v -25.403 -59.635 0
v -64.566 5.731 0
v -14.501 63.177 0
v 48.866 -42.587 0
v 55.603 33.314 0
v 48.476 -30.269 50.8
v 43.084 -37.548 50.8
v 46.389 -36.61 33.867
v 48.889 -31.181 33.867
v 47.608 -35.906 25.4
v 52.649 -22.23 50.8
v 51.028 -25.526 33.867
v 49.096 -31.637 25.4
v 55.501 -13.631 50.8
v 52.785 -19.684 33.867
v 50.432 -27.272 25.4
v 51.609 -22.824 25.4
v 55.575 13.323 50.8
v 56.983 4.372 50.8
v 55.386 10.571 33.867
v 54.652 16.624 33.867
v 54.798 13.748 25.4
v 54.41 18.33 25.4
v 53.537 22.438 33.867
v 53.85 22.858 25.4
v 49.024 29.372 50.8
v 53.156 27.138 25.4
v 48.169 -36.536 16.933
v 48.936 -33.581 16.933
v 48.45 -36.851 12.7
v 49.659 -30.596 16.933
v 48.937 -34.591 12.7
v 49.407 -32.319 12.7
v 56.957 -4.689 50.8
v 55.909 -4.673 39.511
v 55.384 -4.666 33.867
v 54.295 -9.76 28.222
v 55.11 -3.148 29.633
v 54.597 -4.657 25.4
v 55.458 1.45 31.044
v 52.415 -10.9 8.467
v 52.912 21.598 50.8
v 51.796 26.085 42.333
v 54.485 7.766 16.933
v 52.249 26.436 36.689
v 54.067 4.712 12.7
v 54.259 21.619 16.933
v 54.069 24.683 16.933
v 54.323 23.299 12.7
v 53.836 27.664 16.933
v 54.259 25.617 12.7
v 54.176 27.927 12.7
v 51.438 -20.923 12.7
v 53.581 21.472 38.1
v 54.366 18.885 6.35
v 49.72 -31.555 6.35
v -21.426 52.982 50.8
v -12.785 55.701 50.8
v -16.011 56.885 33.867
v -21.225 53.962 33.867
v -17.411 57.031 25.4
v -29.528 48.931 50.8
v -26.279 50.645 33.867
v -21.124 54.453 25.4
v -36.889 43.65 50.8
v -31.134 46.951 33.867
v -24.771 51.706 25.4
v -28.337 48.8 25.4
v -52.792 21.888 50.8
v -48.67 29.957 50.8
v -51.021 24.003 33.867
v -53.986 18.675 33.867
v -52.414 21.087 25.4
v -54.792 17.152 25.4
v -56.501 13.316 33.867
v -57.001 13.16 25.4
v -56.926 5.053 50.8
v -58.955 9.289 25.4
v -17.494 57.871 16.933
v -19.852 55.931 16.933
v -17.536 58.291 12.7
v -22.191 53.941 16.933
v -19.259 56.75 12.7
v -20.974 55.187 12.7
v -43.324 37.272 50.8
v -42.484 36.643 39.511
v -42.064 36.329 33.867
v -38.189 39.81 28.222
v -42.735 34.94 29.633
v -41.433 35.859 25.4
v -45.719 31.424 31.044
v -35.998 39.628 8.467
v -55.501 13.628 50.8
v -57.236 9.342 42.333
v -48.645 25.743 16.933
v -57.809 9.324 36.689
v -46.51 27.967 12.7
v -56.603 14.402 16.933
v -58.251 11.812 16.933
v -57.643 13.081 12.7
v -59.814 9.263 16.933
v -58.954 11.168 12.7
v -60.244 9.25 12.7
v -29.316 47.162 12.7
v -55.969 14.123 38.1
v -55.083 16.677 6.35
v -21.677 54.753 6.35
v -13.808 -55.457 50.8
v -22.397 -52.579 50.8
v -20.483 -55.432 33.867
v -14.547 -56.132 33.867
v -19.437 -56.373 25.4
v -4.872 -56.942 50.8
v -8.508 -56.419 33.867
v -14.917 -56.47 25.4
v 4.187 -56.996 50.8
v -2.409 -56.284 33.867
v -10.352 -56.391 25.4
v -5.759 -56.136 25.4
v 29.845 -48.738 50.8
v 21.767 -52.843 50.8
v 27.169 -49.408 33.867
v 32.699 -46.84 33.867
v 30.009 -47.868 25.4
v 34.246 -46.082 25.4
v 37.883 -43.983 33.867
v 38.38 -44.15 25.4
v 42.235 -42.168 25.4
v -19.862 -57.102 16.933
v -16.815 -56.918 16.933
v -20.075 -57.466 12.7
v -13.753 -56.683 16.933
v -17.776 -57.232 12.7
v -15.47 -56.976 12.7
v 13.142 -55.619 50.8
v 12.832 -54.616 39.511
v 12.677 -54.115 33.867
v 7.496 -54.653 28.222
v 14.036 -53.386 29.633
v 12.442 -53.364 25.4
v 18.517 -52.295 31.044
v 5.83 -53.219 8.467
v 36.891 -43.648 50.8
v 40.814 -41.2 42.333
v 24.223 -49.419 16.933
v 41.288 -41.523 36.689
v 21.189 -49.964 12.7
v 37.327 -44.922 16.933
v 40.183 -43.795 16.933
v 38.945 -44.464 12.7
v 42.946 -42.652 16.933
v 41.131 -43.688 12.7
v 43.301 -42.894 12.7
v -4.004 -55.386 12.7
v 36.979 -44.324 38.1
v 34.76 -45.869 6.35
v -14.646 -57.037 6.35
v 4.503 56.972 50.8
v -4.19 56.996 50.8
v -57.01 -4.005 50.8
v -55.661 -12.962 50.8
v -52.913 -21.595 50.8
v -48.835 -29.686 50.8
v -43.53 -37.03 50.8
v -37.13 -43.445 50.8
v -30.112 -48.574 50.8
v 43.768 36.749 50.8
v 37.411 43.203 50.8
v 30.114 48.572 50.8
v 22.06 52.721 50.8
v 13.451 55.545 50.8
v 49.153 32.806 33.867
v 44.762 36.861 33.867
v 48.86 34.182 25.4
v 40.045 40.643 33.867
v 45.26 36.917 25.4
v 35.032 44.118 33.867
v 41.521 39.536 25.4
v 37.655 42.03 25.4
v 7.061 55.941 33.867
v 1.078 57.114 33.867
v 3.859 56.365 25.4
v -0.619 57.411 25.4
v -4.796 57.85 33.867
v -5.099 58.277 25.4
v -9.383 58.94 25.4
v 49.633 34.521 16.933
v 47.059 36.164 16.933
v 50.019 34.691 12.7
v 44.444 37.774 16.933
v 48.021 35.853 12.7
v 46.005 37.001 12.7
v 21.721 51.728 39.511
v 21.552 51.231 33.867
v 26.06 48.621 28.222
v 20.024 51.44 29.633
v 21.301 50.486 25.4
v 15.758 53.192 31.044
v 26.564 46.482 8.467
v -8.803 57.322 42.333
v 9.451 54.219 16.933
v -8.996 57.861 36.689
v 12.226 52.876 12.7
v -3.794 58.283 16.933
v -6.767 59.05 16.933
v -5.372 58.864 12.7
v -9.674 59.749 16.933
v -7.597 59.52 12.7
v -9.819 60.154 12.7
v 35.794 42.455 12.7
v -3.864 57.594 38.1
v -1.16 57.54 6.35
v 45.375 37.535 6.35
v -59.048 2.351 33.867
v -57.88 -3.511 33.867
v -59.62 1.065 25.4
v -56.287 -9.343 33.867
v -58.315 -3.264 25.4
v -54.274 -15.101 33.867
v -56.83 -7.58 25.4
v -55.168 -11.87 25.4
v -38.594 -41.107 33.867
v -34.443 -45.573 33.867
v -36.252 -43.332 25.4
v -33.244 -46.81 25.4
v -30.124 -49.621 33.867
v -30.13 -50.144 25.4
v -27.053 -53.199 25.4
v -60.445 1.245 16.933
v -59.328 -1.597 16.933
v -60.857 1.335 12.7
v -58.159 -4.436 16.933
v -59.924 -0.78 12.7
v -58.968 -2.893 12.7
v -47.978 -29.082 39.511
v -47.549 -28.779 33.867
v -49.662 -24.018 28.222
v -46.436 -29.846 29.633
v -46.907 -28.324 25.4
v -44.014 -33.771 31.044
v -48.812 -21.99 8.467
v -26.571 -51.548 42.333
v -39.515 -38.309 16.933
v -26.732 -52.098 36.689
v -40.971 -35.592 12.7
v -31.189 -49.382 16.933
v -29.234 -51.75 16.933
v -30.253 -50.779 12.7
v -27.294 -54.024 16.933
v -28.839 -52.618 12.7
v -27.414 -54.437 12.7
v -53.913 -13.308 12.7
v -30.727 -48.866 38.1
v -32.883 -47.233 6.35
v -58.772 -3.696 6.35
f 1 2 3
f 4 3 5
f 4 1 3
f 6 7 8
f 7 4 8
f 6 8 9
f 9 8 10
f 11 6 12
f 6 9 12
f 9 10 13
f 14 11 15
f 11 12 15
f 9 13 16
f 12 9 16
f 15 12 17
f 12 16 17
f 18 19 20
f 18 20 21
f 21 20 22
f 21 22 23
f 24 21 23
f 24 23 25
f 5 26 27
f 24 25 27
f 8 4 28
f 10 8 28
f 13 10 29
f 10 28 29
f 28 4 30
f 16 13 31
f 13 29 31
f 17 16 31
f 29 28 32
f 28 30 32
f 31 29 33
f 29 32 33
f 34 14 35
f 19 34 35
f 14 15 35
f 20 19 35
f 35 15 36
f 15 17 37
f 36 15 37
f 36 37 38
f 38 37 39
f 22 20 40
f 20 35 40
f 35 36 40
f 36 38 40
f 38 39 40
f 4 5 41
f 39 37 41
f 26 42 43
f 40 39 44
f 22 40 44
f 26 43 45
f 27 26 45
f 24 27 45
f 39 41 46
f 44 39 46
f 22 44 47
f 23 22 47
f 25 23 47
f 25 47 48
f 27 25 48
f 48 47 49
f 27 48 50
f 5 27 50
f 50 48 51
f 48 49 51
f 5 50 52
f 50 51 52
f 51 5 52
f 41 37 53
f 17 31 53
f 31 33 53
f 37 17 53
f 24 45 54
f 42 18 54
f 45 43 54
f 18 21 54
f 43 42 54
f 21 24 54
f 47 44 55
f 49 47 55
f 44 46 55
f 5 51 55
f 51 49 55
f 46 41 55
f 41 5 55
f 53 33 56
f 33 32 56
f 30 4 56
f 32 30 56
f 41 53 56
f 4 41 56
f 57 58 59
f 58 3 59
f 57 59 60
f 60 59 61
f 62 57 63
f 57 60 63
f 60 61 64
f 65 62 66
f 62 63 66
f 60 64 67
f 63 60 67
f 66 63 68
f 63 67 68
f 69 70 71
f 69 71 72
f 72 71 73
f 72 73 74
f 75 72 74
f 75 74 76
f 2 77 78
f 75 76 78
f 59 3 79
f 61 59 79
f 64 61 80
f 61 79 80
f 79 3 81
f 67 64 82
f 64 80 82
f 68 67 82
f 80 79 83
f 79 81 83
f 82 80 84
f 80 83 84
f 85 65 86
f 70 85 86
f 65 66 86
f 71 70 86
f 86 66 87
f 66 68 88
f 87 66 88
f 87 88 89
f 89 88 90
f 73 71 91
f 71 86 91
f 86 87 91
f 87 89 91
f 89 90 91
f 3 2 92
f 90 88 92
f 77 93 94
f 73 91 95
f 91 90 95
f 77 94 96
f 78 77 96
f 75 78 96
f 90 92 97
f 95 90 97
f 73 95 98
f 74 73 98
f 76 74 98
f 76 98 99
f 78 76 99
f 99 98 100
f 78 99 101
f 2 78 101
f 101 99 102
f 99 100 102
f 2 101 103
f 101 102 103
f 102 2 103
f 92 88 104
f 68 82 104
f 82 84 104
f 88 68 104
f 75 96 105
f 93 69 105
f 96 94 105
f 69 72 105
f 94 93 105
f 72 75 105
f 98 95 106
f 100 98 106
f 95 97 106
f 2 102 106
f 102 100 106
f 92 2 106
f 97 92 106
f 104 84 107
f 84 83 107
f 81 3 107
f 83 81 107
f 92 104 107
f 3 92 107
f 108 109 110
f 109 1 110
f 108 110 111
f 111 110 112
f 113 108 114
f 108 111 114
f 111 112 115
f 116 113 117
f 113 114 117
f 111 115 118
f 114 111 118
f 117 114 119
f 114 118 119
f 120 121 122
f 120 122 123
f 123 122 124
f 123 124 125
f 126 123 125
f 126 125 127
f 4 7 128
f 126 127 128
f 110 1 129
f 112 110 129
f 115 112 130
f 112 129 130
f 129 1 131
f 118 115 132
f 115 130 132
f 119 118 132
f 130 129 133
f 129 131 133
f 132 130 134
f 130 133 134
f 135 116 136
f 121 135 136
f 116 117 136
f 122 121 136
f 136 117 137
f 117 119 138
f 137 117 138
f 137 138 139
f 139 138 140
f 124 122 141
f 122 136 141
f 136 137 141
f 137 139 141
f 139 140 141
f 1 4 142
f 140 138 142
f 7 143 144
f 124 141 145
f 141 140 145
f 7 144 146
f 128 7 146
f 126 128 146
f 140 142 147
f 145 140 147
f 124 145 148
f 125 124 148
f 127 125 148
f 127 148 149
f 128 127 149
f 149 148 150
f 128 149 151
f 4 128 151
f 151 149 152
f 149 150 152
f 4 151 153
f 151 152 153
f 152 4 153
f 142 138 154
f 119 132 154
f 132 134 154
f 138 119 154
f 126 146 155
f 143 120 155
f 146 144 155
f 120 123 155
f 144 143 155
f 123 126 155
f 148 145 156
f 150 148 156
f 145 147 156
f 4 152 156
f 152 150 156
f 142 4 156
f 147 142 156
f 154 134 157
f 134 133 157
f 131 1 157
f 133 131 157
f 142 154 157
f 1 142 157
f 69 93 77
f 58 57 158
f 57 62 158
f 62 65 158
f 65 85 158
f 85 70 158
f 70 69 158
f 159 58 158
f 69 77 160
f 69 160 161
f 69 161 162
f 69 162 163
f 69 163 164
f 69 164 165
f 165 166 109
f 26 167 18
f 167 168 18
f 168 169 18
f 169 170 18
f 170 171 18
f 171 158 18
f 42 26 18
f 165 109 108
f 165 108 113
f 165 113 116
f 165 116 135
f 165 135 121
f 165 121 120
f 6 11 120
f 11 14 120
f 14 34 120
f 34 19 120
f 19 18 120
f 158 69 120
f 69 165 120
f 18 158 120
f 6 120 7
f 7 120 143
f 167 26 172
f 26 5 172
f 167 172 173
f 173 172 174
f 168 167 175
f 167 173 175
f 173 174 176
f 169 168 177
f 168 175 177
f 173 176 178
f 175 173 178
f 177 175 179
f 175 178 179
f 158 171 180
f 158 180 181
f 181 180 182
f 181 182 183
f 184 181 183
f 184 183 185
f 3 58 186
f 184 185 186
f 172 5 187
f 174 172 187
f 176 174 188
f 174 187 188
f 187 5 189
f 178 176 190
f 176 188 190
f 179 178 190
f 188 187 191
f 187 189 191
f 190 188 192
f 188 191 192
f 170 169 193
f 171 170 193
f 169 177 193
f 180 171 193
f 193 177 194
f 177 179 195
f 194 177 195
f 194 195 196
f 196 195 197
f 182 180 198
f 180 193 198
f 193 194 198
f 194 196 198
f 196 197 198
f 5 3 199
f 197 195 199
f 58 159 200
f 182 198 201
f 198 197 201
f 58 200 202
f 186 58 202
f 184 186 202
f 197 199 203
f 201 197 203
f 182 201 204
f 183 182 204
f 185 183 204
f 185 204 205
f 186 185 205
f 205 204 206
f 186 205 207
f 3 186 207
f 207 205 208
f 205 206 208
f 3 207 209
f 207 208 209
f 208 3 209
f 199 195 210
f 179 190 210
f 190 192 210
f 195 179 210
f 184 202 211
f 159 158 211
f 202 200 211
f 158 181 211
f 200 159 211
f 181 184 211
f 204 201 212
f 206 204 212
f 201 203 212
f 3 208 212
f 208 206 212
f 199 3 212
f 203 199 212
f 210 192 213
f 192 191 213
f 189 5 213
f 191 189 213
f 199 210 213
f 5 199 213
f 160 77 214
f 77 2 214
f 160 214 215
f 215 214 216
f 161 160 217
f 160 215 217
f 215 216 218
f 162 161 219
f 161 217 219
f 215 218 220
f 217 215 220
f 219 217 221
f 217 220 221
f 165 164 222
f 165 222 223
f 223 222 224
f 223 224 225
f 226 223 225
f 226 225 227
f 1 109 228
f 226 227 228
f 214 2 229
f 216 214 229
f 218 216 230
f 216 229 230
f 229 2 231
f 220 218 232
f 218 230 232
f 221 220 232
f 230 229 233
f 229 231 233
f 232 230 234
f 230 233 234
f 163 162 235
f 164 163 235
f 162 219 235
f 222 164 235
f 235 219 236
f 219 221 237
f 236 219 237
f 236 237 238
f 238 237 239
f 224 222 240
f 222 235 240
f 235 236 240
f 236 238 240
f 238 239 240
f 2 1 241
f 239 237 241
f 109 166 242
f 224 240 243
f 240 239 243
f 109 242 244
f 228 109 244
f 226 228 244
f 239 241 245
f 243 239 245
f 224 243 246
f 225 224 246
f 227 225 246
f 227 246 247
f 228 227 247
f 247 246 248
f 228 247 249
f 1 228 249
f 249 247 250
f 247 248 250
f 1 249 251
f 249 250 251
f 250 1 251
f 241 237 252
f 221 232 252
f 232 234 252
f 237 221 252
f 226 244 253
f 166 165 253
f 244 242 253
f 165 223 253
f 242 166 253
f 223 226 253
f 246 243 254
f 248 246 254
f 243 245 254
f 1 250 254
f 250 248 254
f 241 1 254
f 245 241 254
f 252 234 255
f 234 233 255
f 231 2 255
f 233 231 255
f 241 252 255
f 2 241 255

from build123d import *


# Not quite as in the source:
# - the arcs of a loft's sections are written as splines that run evenly, so that the points pair up as in the source's solid


with BuildPart() as f3:
    # F2 (on offset) → F3 section 0
    with BuildSketch(Plane.XY.offset(50.8)):
        with BuildLine():
            add(Edge.make_bspline(
                [(-56.9261720001, 5.0530625782), (-57.190749738, 2.0724151823), (-57.2207451344, -0.9290245136), (-56.8108338665, -6.8997040281), (-56.3709313566, -9.8688833346), (-55.0320467208, -15.7019296265), (-54.1330781644, -18.5657374948), (-51.898187944, -24.1175216058), (-50.5622889304, -26.8054415818), (-47.4864235398, -31.9392601616), (-45.7464883364, -34.3851067349), (-41.9053857897, -38.974548132), (-39.8042573756, -41.1180964425), (-35.2924983654, -45.0501533783), (-32.8819134954, -46.8386221526), (-27.8105925023, -50.0164743355), (-25.1499077762, -51.4058255369), (-22.3969026649, -52.5785246181)],
                knots=[0, 0, 0, 0, 0.125, 0.125, 0.25, 0.25, 0.375, 0.375, 0.5, 0.5, 0.625, 0.625, 0.75, 0.75, 0.875, 0.875, 1, 1, 1, 1], degree=3))
            add(Edge.make_bspline(
                [(-22.3969026649, -52.5785246181), (-19.6438975537, -53.7512236994), (-16.7986278598, -54.7072468902), (-10.9935046529, -56.1624395457), (-8.033709974, -56.6615942622), (-2.0724151823, -57.190749738), (0.9290245136, -57.2207451344), (6.8997040281, -56.8108338665), (9.8688833346, -56.3709313566), (15.7019296265, -55.0320467208), (18.5657374948, -54.1330781644), (24.1175216058, -51.898187944), (26.8054415818, -50.5622889304), (31.9392601616, -47.4864235398), (34.3851067349, -45.7464883364), (38.974548132, -41.9053857897), (41.1180964425, -39.8042573756), (43.0841249104, -37.5483778705)],
                knots=[0, 0, 0, 0, 0.125, 0.125, 0.25, 0.25, 0.375, 0.375, 0.5, 0.5, 0.625, 0.625, 0.75, 0.75, 0.875, 0.875, 1, 1, 1, 1], degree=3))
            add(Edge.make_bspline(
                [(43.0841249104, -37.5483778705), (45.0501533783, -35.2924983654), (46.8386221526, -32.8819134954), (50.0164743355, -27.8105925023), (51.4058255369, -25.1499077762), (53.7512236994, -19.6438975537), (54.7072468902, -16.7986278598), (56.1624395457, -10.9935046529), (56.6615942622, -8.033709974), (57.190749738, -2.0724151823), (57.2207451344, 0.9290245136), (56.8108338665, 6.8997040281), (56.3709313566, 9.8688833346), (55.0320467208, 15.7019296265), (54.1330781644, 18.5657374948), (51.898187944, 24.1175216058), (50.5622889304, 26.8054415818), (49.0243562351, 29.3723508717)],
                knots=[0, 0, 0, 0, 0.125, 0.125, 0.25, 0.25, 0.375, 0.375, 0.5, 0.5, 0.625, 0.625, 0.75, 0.75, 0.875, 0.875, 1, 1, 1, 1], degree=3))
            add(Edge.make_bspline(
                [(49.0243562351, 29.3723508717), (47.4864235398, 31.9392601616), (45.7464883364, 34.3851067349), (41.9053857897, 38.974548132), (39.8042573756, 41.1180964425), (35.2924983654, 45.0501533783), (32.8819134954, 46.8386221526), (27.8105925023, 50.0164743355), (25.1499077762, 51.4058255369), (19.6438975537, 53.7512236994), (16.7986278598, 54.7072468902), (10.9935046529, 56.1624395457), (8.033709974, 56.6615942622), (2.0724151823, 57.190749738), (-0.9290245136, 57.2207451344), (-6.8997040281, 56.8108338665), (-9.8688833346, 56.3709313566), (-12.7854064805, 55.7014890387)],
                knots=[0, 0, 0, 0, 0.125, 0.125, 0.25, 0.25, 0.375, 0.375, 0.5, 0.5, 0.625, 0.625, 0.75, 0.75, 0.875, 0.875, 1, 1, 1, 1], degree=3))
            add(Edge.make_bspline(
                [(-12.7854064805, 55.7014890387), (-15.7019296265, 55.0320467208), (-18.5657374948, 54.1330781644), (-24.1175216058, 51.898187944), (-26.8054415818, 50.5622889304), (-31.9392601616, 47.4864235398), (-34.3851067349, 45.7464883364), (-38.974548132, 41.9053857897), (-41.1180964425, 39.8042573756), (-45.0501533783, 35.2924983654), (-46.8386221526, 32.8819134954), (-50.0164743355, 27.8105925023), (-51.4058255369, 25.1499077762), (-53.7512236994, 19.6438975537), (-54.7072468902, 16.7986278598), (-56.1624395457, 10.9935046529), (-56.6615942622, 8.033709974), (-56.9261720001, 5.0530625782)],
                knots=[0, 0, 0, 0, 0.125, 0.125, 0.25, 0.25, 0.375, 0.375, 0.5, 0.5, 0.625, 0.625, 0.75, 0.75, 0.875, 0.875, 1, 1, 1, 1], degree=3))
        make_face()
    # F0 (on Top) → F3 section 1
    with BuildSketch(Plane.XY):
        Polygon((-64.5657256377, 5.7311890224), (-25.402591142, -59.6346192911), (48.8660609096, -42.5874106504), (55.6034776805, 33.3141520163), (-14.5012218103, 63.1766889029), align=None)
    loft(ruled=True)


solid = f3.part
